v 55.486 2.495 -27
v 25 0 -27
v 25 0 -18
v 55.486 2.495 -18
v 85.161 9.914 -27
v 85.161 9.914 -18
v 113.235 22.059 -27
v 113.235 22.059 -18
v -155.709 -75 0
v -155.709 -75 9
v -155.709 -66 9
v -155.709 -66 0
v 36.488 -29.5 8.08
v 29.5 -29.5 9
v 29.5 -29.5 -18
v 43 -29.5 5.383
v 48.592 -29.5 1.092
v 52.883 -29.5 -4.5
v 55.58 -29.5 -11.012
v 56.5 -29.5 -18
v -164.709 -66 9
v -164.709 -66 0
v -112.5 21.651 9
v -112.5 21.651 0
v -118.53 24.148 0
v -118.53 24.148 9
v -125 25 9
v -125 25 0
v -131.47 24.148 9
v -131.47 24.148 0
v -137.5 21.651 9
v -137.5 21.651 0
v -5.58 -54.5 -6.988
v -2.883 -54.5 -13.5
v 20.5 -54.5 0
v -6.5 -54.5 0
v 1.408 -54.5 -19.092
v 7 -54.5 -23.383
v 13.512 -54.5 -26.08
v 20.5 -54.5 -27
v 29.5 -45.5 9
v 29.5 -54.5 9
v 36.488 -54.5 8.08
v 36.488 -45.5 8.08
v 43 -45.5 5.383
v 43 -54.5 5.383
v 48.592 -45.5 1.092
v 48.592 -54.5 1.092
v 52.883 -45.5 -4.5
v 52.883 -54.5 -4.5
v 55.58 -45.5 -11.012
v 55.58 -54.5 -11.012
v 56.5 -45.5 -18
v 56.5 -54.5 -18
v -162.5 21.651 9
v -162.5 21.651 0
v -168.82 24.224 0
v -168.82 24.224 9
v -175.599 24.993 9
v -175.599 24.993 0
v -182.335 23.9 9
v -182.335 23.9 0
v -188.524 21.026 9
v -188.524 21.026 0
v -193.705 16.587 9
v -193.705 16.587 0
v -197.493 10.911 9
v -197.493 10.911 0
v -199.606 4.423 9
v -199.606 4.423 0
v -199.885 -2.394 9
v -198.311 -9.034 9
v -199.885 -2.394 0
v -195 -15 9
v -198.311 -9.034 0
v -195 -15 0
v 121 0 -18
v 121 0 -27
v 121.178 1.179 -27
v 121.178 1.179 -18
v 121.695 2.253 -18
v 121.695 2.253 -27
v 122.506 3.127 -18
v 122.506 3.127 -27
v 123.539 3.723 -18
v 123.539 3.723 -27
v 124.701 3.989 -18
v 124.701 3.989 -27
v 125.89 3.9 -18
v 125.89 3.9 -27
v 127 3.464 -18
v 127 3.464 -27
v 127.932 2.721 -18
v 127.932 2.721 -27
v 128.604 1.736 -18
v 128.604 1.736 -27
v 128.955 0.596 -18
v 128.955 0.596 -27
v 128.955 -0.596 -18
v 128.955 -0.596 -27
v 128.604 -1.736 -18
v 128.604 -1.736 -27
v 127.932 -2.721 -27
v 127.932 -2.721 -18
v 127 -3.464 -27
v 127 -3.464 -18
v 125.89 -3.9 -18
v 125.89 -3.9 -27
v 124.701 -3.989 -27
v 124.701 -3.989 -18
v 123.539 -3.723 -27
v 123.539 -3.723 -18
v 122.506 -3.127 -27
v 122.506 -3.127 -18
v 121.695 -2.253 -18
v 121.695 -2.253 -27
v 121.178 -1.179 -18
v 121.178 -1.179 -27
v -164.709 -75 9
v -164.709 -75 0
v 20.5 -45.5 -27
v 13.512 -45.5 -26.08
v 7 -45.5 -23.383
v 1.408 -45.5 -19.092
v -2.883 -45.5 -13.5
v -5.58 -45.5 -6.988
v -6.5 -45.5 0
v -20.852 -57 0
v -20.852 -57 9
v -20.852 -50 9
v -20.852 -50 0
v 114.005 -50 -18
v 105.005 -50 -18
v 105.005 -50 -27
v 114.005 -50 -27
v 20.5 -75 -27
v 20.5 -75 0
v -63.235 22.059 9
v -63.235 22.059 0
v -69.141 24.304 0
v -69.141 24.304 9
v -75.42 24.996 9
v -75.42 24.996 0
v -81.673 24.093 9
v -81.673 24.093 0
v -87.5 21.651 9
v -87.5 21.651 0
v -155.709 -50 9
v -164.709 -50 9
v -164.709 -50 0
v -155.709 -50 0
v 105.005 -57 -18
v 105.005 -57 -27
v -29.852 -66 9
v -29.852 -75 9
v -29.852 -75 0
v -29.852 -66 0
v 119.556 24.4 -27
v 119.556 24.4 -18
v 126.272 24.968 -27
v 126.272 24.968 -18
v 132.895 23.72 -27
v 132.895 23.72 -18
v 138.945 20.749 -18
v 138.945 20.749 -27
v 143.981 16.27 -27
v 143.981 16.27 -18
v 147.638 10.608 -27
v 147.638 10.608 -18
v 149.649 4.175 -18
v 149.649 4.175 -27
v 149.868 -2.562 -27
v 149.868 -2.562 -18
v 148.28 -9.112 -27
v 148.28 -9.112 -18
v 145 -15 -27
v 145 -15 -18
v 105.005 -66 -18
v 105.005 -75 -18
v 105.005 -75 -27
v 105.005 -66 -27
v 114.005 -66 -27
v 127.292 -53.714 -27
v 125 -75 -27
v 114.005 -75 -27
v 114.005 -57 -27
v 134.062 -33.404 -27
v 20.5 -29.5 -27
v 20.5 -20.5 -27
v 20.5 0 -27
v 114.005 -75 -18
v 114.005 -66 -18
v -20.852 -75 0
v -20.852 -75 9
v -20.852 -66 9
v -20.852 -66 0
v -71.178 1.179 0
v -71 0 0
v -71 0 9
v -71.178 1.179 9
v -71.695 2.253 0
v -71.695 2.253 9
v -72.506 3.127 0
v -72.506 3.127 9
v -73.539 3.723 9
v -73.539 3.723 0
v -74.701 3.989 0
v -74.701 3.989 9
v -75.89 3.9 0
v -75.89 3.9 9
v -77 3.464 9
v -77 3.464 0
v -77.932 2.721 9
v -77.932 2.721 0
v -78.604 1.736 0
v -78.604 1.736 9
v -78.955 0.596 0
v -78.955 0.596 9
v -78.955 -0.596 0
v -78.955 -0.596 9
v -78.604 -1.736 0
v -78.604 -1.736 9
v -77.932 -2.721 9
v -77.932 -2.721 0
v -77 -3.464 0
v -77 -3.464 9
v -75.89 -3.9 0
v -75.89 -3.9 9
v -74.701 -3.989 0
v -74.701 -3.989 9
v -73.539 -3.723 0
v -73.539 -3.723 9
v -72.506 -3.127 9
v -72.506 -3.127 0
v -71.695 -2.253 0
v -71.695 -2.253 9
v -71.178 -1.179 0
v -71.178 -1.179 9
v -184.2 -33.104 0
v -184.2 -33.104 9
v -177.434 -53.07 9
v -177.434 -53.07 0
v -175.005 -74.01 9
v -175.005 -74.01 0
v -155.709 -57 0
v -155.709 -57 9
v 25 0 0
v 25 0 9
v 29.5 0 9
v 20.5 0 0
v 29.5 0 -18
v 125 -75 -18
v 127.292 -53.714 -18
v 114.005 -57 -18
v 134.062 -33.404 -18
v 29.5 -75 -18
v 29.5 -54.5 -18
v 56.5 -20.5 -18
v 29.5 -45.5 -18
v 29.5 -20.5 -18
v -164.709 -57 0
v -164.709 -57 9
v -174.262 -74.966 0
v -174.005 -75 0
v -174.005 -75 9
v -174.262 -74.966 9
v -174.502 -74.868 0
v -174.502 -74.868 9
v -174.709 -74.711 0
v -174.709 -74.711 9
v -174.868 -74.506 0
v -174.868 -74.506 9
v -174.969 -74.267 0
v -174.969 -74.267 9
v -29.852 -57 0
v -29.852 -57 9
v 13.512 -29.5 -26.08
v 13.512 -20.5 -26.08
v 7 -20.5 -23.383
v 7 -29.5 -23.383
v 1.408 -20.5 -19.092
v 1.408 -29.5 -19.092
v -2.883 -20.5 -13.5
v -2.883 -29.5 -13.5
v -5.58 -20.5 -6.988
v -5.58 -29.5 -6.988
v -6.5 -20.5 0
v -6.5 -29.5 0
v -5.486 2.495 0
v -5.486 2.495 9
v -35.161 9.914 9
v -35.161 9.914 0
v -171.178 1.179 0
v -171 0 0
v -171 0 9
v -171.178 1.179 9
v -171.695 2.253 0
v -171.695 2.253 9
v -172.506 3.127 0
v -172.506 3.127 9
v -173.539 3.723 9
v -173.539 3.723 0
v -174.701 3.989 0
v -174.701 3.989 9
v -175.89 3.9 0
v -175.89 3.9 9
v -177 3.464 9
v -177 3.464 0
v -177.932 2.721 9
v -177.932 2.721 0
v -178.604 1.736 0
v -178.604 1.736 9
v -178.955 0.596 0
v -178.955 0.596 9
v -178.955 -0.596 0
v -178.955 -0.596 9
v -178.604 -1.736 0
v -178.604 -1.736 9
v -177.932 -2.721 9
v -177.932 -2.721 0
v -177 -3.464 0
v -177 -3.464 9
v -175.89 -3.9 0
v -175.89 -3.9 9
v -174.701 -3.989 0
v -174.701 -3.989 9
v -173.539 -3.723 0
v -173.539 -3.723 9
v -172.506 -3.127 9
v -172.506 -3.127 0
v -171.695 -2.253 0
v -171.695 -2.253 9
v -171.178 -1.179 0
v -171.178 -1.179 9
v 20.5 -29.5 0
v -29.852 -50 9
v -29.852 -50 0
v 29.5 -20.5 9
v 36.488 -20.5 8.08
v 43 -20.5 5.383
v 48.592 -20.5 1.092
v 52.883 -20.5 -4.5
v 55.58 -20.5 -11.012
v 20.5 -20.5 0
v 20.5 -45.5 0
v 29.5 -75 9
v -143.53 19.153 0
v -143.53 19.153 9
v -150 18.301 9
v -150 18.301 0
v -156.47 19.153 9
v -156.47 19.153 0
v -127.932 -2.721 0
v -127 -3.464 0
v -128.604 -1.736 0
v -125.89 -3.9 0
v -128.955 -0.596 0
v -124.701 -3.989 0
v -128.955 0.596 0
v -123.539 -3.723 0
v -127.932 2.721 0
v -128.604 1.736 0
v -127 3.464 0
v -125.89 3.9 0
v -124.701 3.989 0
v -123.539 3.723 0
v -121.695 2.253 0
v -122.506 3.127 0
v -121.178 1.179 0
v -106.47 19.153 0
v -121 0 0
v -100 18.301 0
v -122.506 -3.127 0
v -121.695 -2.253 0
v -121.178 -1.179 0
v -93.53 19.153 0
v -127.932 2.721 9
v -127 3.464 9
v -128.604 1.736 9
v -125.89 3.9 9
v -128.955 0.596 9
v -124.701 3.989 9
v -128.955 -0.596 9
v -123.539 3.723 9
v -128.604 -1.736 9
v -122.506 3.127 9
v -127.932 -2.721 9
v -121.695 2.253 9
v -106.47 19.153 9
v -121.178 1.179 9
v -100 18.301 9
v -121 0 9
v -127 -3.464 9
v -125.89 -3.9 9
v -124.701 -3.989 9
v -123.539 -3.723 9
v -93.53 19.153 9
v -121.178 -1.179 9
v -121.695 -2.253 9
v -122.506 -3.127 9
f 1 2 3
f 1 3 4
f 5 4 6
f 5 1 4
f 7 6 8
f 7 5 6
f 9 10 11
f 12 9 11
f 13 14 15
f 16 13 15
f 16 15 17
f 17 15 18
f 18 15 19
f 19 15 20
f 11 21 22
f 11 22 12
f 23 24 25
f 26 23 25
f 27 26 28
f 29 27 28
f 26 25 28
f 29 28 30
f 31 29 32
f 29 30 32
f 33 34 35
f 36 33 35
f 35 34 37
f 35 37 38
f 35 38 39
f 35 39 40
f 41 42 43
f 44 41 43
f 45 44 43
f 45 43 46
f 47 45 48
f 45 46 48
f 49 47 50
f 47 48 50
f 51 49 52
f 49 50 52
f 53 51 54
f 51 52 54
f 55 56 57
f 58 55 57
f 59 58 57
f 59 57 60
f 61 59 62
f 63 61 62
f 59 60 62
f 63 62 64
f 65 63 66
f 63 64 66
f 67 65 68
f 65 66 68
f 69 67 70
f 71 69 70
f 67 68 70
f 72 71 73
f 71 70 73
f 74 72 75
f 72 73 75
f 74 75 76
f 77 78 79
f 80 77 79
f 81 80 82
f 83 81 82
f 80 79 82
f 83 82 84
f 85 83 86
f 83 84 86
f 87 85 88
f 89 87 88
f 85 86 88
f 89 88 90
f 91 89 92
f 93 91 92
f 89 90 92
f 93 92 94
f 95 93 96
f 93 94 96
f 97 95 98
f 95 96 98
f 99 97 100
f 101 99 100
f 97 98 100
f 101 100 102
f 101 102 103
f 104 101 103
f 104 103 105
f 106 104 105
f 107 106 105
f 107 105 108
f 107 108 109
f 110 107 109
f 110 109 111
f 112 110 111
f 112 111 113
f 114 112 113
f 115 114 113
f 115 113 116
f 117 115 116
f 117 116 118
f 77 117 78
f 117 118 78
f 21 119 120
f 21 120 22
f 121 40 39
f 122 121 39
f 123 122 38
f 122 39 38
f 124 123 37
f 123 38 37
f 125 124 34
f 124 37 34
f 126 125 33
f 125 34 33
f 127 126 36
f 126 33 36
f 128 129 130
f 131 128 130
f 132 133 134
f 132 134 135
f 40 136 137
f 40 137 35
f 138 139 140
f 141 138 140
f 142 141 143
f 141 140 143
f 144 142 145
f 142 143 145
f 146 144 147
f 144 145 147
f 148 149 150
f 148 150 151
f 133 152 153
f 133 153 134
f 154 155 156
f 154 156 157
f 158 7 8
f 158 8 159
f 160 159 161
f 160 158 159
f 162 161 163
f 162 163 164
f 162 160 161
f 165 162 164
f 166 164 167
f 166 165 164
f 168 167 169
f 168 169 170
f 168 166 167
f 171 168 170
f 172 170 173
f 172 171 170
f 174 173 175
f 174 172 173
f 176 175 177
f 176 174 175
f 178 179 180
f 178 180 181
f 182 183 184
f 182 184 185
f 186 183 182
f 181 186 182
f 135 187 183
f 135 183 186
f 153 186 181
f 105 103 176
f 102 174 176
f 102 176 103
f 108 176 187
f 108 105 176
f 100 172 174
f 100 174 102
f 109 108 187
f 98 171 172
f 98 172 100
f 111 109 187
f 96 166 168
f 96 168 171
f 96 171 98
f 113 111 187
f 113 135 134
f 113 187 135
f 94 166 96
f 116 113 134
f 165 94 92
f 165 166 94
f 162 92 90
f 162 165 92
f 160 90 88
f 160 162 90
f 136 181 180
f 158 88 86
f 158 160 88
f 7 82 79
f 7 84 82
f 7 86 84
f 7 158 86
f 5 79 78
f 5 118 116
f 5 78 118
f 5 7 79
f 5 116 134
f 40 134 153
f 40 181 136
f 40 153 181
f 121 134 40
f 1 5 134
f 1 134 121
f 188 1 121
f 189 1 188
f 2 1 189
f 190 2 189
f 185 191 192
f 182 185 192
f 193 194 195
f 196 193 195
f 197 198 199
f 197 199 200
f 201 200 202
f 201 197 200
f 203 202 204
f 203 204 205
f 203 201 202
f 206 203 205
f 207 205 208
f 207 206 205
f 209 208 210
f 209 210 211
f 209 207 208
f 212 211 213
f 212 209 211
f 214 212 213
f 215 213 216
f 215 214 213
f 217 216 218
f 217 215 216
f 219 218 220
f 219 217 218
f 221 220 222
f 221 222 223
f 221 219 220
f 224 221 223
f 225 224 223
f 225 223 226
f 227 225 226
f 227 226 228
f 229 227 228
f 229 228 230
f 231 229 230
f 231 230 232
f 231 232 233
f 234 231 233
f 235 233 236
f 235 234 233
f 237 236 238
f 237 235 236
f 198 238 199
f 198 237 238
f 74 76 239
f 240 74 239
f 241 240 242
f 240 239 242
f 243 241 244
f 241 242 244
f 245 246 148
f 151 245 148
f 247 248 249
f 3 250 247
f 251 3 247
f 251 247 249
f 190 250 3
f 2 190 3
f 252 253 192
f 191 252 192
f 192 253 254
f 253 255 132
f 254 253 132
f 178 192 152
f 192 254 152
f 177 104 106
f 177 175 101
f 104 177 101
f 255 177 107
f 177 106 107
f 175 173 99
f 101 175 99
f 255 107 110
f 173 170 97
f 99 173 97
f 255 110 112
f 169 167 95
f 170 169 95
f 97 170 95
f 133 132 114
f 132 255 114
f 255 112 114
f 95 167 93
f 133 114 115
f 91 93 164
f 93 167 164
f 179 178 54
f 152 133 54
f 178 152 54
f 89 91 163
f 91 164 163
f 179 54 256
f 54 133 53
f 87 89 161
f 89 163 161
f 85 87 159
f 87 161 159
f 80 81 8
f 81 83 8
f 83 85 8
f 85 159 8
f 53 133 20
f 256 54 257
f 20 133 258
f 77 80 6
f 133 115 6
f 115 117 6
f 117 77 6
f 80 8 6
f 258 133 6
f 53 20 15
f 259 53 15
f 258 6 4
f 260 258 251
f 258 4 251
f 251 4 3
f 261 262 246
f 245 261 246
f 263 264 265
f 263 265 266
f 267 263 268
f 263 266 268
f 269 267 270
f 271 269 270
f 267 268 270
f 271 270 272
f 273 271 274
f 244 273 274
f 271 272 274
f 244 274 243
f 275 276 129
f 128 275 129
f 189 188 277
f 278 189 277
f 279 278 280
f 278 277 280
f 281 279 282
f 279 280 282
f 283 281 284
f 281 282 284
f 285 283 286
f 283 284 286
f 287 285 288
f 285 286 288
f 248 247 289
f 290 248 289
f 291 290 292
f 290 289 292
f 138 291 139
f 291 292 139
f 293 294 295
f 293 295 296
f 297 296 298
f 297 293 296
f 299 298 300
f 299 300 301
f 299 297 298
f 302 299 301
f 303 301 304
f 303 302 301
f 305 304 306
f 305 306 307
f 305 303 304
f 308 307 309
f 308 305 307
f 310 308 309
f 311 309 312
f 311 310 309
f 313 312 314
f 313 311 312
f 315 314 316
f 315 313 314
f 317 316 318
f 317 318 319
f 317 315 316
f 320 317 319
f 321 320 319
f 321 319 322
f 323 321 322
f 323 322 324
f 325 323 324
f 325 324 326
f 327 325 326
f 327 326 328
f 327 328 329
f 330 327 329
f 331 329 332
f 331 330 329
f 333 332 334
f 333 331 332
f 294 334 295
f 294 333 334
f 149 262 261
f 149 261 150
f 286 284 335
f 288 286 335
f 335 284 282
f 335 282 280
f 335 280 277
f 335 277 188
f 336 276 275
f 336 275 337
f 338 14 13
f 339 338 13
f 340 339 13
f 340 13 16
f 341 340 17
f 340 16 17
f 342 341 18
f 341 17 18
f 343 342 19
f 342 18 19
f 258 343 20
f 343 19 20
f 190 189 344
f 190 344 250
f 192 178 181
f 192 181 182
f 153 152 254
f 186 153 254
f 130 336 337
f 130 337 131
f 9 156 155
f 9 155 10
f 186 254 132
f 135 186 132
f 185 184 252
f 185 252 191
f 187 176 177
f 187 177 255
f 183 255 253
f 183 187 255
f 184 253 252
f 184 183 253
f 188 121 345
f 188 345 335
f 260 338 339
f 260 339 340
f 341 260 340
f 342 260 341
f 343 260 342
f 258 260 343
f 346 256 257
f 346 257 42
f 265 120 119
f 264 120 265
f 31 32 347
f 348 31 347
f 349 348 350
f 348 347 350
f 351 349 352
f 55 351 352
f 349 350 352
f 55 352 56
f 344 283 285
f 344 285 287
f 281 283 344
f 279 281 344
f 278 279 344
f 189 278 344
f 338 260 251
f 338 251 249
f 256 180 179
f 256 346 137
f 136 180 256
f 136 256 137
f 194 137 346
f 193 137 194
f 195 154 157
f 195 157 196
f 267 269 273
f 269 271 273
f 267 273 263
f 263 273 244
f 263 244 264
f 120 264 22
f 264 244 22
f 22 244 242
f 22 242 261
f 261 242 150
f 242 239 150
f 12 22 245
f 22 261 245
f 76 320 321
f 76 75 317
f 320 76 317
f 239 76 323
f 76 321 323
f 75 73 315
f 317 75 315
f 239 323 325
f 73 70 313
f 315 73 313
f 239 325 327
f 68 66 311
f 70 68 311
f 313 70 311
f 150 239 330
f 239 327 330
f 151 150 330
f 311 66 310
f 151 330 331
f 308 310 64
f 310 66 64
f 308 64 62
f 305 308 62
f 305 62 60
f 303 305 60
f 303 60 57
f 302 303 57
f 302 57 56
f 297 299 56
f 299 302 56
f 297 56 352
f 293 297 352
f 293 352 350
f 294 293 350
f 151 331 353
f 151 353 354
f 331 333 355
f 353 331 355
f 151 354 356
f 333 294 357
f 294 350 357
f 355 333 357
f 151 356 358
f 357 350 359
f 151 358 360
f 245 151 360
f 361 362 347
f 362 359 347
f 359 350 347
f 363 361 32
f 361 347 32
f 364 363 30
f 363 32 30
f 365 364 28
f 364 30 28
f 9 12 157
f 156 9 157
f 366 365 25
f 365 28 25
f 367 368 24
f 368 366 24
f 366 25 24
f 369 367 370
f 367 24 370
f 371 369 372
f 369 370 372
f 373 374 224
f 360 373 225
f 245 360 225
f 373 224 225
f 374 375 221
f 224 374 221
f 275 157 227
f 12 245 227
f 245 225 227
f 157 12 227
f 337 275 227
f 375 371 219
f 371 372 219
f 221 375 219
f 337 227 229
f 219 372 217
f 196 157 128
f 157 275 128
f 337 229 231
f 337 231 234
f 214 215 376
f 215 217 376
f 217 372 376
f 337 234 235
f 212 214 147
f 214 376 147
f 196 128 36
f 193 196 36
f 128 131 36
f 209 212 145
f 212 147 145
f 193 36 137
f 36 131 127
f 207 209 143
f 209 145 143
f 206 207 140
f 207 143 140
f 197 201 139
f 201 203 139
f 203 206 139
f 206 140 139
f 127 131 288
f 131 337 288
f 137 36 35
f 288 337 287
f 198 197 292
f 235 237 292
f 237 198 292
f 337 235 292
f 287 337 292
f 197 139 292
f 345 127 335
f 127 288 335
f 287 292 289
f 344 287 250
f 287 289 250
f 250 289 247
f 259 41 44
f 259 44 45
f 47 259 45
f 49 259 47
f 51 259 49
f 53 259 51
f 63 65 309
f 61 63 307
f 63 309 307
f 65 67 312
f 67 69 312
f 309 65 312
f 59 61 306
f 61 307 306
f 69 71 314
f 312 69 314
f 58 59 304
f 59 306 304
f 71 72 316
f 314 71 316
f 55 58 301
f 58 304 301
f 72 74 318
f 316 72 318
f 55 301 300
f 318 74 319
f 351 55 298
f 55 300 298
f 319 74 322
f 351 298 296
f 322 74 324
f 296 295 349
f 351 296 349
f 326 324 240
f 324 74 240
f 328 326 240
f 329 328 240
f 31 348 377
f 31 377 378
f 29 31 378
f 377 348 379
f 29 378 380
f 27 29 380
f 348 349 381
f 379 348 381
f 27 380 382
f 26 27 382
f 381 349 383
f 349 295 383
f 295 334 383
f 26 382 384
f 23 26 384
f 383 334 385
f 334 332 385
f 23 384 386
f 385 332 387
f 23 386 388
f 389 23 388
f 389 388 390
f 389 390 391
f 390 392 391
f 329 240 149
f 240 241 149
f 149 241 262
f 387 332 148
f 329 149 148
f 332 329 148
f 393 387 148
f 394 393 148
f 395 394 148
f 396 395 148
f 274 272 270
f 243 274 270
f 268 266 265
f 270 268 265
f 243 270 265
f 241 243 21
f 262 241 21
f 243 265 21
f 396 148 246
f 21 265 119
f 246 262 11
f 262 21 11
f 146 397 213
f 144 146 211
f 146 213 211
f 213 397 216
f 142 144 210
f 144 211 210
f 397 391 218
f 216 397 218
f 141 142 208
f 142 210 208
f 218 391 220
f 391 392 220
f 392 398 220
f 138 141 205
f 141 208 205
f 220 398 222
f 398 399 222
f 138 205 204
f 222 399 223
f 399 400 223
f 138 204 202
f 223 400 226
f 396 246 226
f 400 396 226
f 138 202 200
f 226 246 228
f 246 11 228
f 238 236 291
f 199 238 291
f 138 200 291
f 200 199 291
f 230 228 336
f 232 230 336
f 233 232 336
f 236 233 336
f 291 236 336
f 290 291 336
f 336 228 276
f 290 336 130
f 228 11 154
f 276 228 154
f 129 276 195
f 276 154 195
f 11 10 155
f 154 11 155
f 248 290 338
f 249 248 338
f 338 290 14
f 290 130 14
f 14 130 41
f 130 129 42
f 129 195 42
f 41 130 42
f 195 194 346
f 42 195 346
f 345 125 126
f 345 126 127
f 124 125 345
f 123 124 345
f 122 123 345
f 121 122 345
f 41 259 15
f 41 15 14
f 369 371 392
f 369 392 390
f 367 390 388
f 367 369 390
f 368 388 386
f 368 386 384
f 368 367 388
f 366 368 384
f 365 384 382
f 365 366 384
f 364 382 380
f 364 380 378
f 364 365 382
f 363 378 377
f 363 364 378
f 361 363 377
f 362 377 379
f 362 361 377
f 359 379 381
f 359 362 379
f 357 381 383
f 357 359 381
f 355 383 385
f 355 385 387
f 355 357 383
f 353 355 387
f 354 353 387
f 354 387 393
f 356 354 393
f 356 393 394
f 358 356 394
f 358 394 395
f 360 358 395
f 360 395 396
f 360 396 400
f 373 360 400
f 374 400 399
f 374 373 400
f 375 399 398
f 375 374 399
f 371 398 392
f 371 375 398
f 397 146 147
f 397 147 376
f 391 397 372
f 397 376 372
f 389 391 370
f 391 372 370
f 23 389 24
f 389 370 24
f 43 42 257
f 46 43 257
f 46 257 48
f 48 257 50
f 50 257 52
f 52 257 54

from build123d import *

# Parameters (mm, degrees)
SKETCH1_R                = 8
SKETCH1_R_2              = 4
BOSS_EXTRUDE1_DEPTH      = 9
BOSS_EXTRUDE1_2_DEPTH    = 9
SKETCH2_R                = 4
BOSS_EXTRUDE3_DEPTH      = 9
FILLET1_R                = 1
CUT_EXTRUDE1_DEPTH       = 214.789616212
SKETCH4_W                = 9
SKETCH4_H                = 27
BOSS_EXTRUDE4_DEPTH      = 75
BOSS_EXTRUDE5_START      = 9
SKETCH5_R                = 25
SKETCH5_R_2              = 4
BOSS_EXTRUDE5_DEPTH      = 9
BOSS_EXTRUDE6_DEPTH      = 4.5
BOSS_EXTRUDE6_DEPTH_BACK = 4.5
BOSS_EXTRUDE7_DEPTH      = 4.5
BOSS_EXTRUDE7_DEPTH_BACK = 4.5
BOSS_EXTRUDE7_START      = -25
SKETCH9_W                = 9
SKETCH9_H                = 7
SKETCH9_H_2              = 9
CUT_EXTRUDE2_DEPTH       = 217.612557346


with BuildPart() as part:
    # Sketch1 → Boss-Extrude1 (new body)
    with BuildSketch(Plane.XY):
        with Locations((-125, 0)):
            Circle(SKETCH1_R)
        with Locations((-125, 0)):
            Circle(SKETCH1_R_2, mode=Mode.SUBTRACT)
    extrude(amount=BOSS_EXTRUDE1_DEPTH)



with BuildPart() as body_2:
    # Sketch1 → Boss-Extrude1 2 (new body)
    with BuildSketch(Plane.XY):
        with Locations((125, 0)):
            Circle(SKETCH1_R)
        with Locations((125, 0)):
            Circle(SKETCH1_R_2, mode=Mode.SUBTRACT)
    extrude(amount=BOSS_EXTRUDE1_2_DEPTH)


with BuildPart() as part_1:
    add(part.part)

    add(body_2.part)  # Boss-Extrude3 merges body 2
    # Sketch2 → Boss-Extrude3 (add)
    with BuildSketch(Plane.XY):
        with BuildLine():
            Line((-175, -75), (125, -75))
            ThreePointArc((125, -75), (130.131670325, -43.377223009), (145.000000492, -14.999999344))
            ThreePointArc((145.000000492, -14.999999344), (143.981414944, 16.269784471), (113.235294528, 22.058823748))
            ThreePointArc((113.235294528, 22.058823748), (25.000000075, 0), (-63.235294395, 22.058823677))
            ThreePointArc((-63.235294395, 22.058823677), (-75.420498385, 24.996463372), (-87.499999896, 21.650635154))
            ThreePointArc((-87.499999896, 21.650635154), (-99.999999954, 18.301270189), (-112.500000024, 21.650635108))
            ThreePointArc((-112.500000024, 21.650635108), (-124.99999995, 25), (-137.49999989, 21.650635158))
            ThreePointArc((-137.49999989, 21.650635158), (-149.999999954, 18.301270189), (-162.50000003, 21.650635112))
            ThreePointArc((-162.50000003, 21.650635112), (-193.705072901, 16.586749162), (-195.000000551, -14.999999265))
            ThreePointArc((-195.000000551, -14.999999265), (-180.13167034, -43.377222962), (-175, -75))
        make_face()
        with Locations((125, 0)):
            Circle(SKETCH2_R, mode=Mode.SUBTRACT)
        with Locations((-175, 0)):
            Circle(SKETCH2_R, mode=Mode.SUBTRACT)
        with Locations((-125, 0)):
            Circle(SKETCH2_R, mode=Mode.SUBTRACT)
        with Locations((-75, 0)):
            Circle(SKETCH2_R, mode=Mode.SUBTRACT)
    extrude(amount=BOSS_EXTRUDE3_DEPTH)

    # Fillet1
    fillet1_edges = [part_1.edges().sort_by_distance(p)[0] for p in [
        (-175, -75, 4.5),
        (125, -75, 4.5),
    ]]
    fillet(fillet1_edges, radius=FILLET1_R)

    # Sketch3 → Cut-Extrude1 (cut, through all)
    with BuildSketch(Plane.XY):
        Polygon((25, 0), (25, -75), (150, -75), (150, 25), (25, 25), align=None)
    extrude(amount=CUT_EXTRUDE1_DEPTH, mode=Mode.SUBTRACT)

    # Sketch4 → Boss-Extrude4 (add)
    with BuildSketch(Plane.XZ.offset(75)):
        with Locations((25, -4.5)):
            Rectangle(SKETCH4_W, SKETCH4_H)
    extrude(amount=-BOSS_EXTRUDE4_DEPTH)

    # Sketch5 → Boss-Extrude5 (add)
    # profile 1 of 4: a face of its own
    with BuildSketch(Plane(origin=(0, 0, -18), x_dir=(-1, 0, 0), z_dir=(0, 0, -1)).offset(BOSS_EXTRUDE5_START)):
        with BuildLine():
            ThreePointArc((-145.000000304, -14.999999594), (-130.131670275, -43.377223158), (-125, -75))
            Line((-125, -75), (-29.5, -75))
            Line((-29.5, -75), (-29.5, 0))
            Line((-29.5, 0), (-100, 0))
            ThreePointArc((-100, 0), (-117.09430609, -23.717082532), (-145.000000304, -14.999999594))
        make_face()
    # profile 2 of 4: a face of its own
    with BuildSketch(Plane(origin=(0, 0, -18), x_dir=(-1, 0, 0), z_dir=(0, 0, -1)).offset(BOSS_EXTRUDE5_START)):
        with Locations((-125, 0)):
            Circle(SKETCH5_R)
        with Locations((-125, 0)):
            Circle(SKETCH5_R_2, mode=Mode.SUBTRACT)
    # profile 3 of 4: a face of its own
    with BuildSketch(Plane(origin=(0, 0, -18), x_dir=(-1, 0, 0), z_dir=(0, 0, -1)).offset(BOSS_EXTRUDE5_START)):
        Polygon((-29.5, 0), (-29.5, -75), (-20.5, -75), (-20.5, 0), (-25, 0), align=None)
    # profile 4 of 4: a face of its own
    with BuildSketch(Plane(origin=(0, 0, -18), x_dir=(-1, 0, 0), z_dir=(0, 0, -1)).offset(BOSS_EXTRUDE5_START)):
        with BuildLine():
            Line((-100, 0), (-29.5, 0))
            Line((-29.5, 0), (-25, 0))
            ThreePointArc((-25, 0), (-70.475429529, 5.598281181), (-113.235293817, 22.058823369))
            ThreePointArc((-113.235293817, 22.058823369), (-103.56267677, 12.86239374), (-100, 0))
        make_face()
    extrude(amount=-BOSS_EXTRUDE5_DEPTH)

    # Sketch7 → Boss-Extrude6 (add, two sides: drawn at the far end of the back side and taken through both)
    with BuildSketch(Plane(origin=(0, -25, 0), x_dir=(1, 0, 0), z_dir=(0, 1, 0)).offset(-BOSS_EXTRUDE6_DEPTH_BACK)):
        with BuildLine():
            Line((56.5, 18), (29.5, 18))
            Line((29.5, 18), (29.5, -9))
            ThreePointArc((29.5, -9), (48.591883092, -1.091883092), (56.5, 18))
        make_face()
        with BuildLine():
            Line((-6.5, 0), (20.5, 0))
            Line((20.5, 0), (20.5, 27))
            ThreePointArc((20.5, 27), (1.408116908, 19.091883092), (-6.5, 0))
        make_face()
    extrude(amount=BOSS_EXTRUDE6_DEPTH + BOSS_EXTRUDE6_DEPTH_BACK)

    # Sketch7<3> → Boss-Extrude7 (add, two sides: drawn at the far end of the back side and taken through both)
    with BuildSketch(Plane(origin=(0, -25, 0), x_dir=(1, 0, 0), z_dir=(0, 1, 0)).offset(BOSS_EXTRUDE7_START - BOSS_EXTRUDE7_DEPTH_BACK)):
        with BuildLine():
            Line((56.5, 18), (29.5, 18))
            Line((29.5, 18), (29.5, -9))
            ThreePointArc((29.5, -9), (48.591883092, -1.091883092), (56.5, 18))
        make_face()
        with BuildLine():
            Line((-6.5, 0), (20.5, 0))
            Line((20.5, 0), (20.5, 27))
            ThreePointArc((20.5, 27), (1.408116908, 19.091883092), (-6.5, 0))
        make_face()
    extrude(amount=BOSS_EXTRUDE7_DEPTH + BOSS_EXTRUDE7_DEPTH_BACK)

    # Sketch9 → Cut-Extrude2 (cut, through all)
    with BuildSketch(Plane.XY.offset(9)):
        with Locations((-160.208548161, -53.5)):
            Rectangle(SKETCH9_W, SKETCH9_H)
        with Locations((-160.208548161, -70.5)):
            Rectangle(SKETCH9_W, SKETCH9_H_2)
        with Locations((-25.351798772, -53.5)):
            Rectangle(SKETCH9_W, SKETCH9_H)
        with Locations((-25.351798772, -70.5)):
            Rectangle(SKETCH9_W, SKETCH9_H_2)
        with Locations((109.504950616, -53.5)):
            Rectangle(SKETCH9_W, SKETCH9_H)
        with Locations((109.504950616, -70.5)):
            Rectangle(SKETCH9_W, SKETCH9_H_2)
    extrude(amount=-CUT_EXTRUDE2_DEPTH, mode=Mode.SUBTRACT)


solid = part_1.part
